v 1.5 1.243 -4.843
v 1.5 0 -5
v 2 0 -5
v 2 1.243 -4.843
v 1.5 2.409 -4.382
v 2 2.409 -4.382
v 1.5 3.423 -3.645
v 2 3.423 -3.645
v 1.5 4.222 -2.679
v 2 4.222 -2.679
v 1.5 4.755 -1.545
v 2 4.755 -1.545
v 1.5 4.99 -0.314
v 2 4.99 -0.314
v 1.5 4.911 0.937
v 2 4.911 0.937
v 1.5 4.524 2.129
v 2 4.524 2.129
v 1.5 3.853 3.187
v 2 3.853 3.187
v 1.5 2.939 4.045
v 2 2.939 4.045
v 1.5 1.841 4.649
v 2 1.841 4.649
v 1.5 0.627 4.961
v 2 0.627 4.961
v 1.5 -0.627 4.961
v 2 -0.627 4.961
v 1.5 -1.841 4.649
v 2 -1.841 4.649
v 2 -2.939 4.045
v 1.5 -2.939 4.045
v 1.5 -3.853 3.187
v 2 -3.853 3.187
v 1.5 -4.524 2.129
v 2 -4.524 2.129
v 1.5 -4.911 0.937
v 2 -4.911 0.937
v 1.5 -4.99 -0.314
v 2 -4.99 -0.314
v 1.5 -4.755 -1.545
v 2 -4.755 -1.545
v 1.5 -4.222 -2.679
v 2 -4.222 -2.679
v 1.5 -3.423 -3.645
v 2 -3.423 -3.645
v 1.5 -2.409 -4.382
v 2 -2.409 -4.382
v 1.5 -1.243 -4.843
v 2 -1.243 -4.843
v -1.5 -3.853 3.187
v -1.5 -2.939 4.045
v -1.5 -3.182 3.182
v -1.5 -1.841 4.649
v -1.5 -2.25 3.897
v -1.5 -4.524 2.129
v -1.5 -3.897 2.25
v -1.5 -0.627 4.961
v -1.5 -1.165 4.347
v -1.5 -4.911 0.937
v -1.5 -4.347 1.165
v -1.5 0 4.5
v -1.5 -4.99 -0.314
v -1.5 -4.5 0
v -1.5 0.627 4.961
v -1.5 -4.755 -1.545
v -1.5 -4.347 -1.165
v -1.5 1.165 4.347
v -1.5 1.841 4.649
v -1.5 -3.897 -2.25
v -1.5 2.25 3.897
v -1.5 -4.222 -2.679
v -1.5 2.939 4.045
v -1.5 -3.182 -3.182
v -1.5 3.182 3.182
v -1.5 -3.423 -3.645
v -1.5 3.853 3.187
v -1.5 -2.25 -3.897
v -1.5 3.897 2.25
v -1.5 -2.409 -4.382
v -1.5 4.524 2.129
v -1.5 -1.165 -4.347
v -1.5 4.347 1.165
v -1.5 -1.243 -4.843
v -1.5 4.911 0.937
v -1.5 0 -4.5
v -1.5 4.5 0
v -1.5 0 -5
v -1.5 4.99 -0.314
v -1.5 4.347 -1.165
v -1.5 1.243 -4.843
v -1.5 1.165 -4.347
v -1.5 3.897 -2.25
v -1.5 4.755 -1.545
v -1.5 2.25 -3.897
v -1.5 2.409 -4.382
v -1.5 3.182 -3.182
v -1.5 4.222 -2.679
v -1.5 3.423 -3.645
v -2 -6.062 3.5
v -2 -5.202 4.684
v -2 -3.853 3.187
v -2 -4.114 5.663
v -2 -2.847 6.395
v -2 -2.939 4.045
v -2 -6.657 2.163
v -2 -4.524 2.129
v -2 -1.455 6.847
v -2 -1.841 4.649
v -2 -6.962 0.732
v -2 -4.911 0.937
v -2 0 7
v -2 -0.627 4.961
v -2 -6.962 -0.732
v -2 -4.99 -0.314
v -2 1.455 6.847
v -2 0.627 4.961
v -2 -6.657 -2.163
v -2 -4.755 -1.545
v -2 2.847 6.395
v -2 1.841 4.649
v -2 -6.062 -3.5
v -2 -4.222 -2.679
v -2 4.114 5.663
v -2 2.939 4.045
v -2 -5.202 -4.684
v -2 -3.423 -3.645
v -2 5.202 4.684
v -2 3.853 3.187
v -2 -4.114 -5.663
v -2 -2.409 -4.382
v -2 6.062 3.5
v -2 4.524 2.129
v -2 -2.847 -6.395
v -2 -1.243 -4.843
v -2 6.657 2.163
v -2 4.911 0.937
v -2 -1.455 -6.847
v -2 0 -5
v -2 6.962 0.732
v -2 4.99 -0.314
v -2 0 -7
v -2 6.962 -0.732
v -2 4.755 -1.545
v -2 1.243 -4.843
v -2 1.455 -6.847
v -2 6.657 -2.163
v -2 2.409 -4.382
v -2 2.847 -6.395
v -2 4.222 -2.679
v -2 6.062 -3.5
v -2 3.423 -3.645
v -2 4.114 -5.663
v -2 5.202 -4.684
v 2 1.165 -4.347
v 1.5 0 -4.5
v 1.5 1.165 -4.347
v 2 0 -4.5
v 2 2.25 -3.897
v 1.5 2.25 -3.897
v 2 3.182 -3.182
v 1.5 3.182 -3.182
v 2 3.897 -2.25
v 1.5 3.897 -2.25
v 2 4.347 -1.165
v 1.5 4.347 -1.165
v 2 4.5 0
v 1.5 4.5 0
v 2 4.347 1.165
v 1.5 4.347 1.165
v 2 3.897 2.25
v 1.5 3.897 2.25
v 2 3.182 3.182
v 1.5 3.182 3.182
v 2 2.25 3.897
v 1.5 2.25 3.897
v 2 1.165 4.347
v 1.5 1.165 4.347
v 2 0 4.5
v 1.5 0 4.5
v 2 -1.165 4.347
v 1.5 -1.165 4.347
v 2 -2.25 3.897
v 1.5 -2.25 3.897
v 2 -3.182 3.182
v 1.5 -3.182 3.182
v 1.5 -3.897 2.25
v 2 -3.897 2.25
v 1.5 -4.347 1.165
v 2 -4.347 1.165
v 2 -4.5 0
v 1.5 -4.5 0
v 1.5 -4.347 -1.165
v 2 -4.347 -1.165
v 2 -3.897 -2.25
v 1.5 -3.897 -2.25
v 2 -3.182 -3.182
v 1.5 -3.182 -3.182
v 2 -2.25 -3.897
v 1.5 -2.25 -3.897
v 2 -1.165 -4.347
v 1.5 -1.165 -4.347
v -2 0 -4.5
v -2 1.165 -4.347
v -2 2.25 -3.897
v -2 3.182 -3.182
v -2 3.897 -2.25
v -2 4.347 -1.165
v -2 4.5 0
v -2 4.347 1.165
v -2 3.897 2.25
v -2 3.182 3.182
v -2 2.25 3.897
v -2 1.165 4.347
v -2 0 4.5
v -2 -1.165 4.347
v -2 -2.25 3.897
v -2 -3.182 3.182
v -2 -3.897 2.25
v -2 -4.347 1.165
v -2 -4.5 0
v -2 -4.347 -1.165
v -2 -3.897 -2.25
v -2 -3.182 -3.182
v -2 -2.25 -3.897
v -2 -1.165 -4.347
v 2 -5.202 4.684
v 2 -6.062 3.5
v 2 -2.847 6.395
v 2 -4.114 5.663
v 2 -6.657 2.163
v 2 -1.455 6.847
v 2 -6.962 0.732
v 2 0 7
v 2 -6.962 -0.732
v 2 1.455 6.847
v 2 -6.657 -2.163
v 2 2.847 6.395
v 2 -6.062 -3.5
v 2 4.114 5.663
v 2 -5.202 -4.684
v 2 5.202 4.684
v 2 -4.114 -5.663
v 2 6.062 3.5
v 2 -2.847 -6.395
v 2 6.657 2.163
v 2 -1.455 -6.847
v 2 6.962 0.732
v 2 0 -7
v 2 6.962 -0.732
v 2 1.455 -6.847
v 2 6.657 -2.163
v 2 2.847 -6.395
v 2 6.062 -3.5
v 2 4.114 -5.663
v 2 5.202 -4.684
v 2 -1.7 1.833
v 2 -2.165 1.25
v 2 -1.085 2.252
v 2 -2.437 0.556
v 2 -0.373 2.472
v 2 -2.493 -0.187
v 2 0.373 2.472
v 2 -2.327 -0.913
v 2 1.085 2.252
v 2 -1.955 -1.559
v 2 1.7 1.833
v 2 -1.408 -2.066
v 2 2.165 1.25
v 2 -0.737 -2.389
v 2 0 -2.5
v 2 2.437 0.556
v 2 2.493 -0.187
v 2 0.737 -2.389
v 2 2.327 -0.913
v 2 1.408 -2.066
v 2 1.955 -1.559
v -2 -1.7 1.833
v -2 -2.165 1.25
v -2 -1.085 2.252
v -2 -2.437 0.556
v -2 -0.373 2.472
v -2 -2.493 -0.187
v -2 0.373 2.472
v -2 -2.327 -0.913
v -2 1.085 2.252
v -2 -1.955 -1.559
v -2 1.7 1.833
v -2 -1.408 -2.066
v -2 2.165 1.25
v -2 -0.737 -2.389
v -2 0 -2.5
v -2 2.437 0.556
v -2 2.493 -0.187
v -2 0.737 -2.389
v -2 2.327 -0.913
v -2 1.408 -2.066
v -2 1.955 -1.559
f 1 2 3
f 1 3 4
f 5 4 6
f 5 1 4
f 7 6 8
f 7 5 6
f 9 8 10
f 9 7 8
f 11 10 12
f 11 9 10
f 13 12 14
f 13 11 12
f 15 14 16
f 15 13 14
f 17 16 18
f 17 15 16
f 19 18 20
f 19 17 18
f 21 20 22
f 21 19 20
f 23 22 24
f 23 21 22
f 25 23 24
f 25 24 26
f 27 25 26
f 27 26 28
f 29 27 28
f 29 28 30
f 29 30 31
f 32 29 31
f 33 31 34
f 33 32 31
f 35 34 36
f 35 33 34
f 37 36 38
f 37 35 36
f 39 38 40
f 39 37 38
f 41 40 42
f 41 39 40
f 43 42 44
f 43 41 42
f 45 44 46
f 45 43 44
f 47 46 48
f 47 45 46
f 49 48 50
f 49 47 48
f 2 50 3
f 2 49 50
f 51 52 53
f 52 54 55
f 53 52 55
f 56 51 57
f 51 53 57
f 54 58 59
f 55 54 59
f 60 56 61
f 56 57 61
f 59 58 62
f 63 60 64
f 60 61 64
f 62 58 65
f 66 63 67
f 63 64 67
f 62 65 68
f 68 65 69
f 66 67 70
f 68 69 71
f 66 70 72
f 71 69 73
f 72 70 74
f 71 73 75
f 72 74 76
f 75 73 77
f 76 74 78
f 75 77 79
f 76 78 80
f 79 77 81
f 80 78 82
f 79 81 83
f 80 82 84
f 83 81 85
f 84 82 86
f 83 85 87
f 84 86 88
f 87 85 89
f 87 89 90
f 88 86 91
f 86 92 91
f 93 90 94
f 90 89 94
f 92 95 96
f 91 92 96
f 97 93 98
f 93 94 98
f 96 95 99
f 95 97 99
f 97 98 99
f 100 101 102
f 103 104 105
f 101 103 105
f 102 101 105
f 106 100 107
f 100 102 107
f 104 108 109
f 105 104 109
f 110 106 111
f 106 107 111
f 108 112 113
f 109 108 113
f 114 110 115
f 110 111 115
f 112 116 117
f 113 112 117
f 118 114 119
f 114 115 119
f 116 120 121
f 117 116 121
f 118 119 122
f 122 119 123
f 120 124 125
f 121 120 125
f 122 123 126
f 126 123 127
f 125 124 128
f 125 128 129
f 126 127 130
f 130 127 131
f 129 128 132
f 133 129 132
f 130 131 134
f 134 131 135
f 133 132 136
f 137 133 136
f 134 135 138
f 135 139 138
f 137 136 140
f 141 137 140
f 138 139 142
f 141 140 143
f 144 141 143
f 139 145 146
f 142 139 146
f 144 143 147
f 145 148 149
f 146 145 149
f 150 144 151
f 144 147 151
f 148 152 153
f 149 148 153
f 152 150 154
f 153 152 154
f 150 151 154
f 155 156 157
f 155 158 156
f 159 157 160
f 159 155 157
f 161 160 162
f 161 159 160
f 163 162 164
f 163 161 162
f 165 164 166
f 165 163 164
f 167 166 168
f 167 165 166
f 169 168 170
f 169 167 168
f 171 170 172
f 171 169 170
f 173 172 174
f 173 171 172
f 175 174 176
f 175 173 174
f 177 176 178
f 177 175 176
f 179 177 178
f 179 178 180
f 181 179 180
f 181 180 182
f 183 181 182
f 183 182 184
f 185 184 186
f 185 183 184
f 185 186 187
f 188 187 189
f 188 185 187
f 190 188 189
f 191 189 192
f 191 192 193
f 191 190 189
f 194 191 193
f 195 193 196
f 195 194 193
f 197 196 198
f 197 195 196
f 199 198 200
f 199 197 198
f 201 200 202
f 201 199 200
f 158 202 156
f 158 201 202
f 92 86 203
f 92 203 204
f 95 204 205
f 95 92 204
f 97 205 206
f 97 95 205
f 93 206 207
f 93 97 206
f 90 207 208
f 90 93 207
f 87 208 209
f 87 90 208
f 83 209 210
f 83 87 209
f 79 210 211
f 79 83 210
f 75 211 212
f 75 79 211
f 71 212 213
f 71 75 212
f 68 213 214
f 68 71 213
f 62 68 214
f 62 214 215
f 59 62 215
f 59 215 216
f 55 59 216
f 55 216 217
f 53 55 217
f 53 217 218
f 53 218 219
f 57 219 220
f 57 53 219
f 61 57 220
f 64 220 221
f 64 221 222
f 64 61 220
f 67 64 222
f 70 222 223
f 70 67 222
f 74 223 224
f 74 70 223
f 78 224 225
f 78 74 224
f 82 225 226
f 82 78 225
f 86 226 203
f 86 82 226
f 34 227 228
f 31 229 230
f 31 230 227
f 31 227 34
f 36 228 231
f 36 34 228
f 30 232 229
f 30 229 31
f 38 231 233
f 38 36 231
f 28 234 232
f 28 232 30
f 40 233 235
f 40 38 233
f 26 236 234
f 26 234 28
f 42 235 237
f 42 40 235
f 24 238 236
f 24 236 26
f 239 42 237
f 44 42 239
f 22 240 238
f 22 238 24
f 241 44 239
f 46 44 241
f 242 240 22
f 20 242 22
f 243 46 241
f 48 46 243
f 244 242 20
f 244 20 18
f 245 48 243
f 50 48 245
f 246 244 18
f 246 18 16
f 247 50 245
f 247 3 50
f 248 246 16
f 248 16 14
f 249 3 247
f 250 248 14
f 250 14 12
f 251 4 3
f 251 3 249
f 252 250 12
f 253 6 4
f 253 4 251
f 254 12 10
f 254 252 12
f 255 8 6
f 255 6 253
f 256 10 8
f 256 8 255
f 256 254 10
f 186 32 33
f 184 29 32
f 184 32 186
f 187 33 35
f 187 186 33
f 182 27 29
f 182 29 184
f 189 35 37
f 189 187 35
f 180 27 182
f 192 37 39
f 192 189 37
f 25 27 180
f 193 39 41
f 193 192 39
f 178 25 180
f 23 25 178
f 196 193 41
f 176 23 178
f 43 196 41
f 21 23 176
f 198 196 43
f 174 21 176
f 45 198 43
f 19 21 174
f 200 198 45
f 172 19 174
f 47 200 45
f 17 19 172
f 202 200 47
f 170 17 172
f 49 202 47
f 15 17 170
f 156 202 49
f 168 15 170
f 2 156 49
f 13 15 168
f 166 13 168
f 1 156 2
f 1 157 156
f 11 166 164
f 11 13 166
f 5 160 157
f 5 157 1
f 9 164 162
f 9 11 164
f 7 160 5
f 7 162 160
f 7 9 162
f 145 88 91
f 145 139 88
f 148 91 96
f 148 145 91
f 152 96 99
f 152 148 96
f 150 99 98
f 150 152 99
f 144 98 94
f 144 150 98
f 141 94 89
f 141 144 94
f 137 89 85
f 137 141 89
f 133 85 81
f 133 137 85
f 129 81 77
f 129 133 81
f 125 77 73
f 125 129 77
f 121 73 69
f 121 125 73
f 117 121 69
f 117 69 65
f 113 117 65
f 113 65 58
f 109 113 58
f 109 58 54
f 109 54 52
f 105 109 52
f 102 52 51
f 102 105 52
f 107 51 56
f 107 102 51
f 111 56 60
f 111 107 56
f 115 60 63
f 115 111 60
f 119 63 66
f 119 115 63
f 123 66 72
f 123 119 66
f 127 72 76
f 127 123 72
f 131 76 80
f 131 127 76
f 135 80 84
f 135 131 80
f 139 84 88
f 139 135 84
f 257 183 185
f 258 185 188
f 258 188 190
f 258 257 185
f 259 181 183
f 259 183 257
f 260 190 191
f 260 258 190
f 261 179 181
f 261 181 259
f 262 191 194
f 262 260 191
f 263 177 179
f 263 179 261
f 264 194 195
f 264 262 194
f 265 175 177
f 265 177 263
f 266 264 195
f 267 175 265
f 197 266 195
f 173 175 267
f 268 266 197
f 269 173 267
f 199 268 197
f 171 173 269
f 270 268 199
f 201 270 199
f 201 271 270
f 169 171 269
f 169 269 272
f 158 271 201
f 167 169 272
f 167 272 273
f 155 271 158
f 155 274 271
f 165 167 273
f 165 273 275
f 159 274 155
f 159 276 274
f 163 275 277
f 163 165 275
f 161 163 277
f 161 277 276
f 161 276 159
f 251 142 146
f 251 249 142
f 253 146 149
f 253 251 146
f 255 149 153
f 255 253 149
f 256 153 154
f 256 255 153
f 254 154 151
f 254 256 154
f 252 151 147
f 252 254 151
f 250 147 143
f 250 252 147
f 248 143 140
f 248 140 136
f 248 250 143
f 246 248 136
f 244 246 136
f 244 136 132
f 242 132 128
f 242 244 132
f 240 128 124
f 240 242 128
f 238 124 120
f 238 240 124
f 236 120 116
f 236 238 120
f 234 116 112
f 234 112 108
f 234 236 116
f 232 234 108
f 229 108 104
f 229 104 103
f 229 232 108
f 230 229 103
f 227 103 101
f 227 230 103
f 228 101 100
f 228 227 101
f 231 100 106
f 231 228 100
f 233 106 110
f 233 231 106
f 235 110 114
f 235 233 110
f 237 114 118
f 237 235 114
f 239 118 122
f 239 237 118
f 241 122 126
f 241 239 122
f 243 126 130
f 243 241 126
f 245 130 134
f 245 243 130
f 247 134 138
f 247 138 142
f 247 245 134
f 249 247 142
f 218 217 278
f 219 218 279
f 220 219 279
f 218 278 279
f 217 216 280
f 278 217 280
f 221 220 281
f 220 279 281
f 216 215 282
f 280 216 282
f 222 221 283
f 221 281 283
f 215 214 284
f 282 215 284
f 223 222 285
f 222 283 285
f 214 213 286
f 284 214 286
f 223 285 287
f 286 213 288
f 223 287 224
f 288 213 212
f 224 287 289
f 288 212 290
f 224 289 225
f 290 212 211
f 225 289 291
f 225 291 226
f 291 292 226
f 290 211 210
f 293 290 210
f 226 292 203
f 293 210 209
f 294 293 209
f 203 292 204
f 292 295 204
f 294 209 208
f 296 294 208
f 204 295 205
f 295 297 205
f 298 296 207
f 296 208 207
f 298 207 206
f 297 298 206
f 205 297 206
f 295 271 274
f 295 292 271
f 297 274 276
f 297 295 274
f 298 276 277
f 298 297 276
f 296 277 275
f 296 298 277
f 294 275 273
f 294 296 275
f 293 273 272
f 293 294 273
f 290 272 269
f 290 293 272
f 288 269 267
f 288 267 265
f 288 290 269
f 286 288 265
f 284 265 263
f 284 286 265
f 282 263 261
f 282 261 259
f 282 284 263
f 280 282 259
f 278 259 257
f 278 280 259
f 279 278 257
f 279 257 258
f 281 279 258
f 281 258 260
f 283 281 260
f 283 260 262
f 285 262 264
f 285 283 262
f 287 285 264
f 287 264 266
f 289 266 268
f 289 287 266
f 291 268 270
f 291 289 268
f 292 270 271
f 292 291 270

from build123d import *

# Parameters (mm, degrees)
SKETCH2_R           = 7
SKETCH2_R_2         = 5
BOSS_EXTRUDE1_DEPTH = 2
SKETCH2_3_R         = 5
SKETCH2_3_R_2       = 4.5
BOSS_EXTRUDE2_DEPTH = 1.5
SKETCH2_4_R         = 4.5
SKETCH2_4_R_2       = 2.5
BOSS_EXTRUDE3_DEPTH = 2


with BuildPart() as part:
    # Sketch2 → Boss-Extrude1 (new, symmetric)
    with BuildSketch(Plane(origin=(0, 0, 0), x_dir=(0, 0, -1), z_dir=(1, 0, 0))):
        Circle(SKETCH2_R)
        Circle(SKETCH2_R_2, mode=Mode.SUBTRACT)
    extrude(amount=BOSS_EXTRUDE1_DEPTH, both=True)

    # Sketch2<3> → Boss-Extrude2 (add, symmetric)
    with BuildSketch(Plane(origin=(0, 0, 0), x_dir=(0, 0, -1), z_dir=(1, 0, 0))):
        Circle(SKETCH2_3_R)
        Circle(SKETCH2_3_R_2, mode=Mode.SUBTRACT)
    extrude(amount=BOSS_EXTRUDE2_DEPTH, both=True)

    # Sketch2<4> → Boss-Extrude3 (add, symmetric)
    with BuildSketch(Plane(origin=(0, 0, 0), x_dir=(0, 0, -1), z_dir=(1, 0, 0))):
        Circle(SKETCH2_4_R)
        Circle(SKETCH2_4_R_2, mode=Mode.SUBTRACT)
    extrude(amount=BOSS_EXTRUDE3_DEPTH, both=True)


solid = part.part
